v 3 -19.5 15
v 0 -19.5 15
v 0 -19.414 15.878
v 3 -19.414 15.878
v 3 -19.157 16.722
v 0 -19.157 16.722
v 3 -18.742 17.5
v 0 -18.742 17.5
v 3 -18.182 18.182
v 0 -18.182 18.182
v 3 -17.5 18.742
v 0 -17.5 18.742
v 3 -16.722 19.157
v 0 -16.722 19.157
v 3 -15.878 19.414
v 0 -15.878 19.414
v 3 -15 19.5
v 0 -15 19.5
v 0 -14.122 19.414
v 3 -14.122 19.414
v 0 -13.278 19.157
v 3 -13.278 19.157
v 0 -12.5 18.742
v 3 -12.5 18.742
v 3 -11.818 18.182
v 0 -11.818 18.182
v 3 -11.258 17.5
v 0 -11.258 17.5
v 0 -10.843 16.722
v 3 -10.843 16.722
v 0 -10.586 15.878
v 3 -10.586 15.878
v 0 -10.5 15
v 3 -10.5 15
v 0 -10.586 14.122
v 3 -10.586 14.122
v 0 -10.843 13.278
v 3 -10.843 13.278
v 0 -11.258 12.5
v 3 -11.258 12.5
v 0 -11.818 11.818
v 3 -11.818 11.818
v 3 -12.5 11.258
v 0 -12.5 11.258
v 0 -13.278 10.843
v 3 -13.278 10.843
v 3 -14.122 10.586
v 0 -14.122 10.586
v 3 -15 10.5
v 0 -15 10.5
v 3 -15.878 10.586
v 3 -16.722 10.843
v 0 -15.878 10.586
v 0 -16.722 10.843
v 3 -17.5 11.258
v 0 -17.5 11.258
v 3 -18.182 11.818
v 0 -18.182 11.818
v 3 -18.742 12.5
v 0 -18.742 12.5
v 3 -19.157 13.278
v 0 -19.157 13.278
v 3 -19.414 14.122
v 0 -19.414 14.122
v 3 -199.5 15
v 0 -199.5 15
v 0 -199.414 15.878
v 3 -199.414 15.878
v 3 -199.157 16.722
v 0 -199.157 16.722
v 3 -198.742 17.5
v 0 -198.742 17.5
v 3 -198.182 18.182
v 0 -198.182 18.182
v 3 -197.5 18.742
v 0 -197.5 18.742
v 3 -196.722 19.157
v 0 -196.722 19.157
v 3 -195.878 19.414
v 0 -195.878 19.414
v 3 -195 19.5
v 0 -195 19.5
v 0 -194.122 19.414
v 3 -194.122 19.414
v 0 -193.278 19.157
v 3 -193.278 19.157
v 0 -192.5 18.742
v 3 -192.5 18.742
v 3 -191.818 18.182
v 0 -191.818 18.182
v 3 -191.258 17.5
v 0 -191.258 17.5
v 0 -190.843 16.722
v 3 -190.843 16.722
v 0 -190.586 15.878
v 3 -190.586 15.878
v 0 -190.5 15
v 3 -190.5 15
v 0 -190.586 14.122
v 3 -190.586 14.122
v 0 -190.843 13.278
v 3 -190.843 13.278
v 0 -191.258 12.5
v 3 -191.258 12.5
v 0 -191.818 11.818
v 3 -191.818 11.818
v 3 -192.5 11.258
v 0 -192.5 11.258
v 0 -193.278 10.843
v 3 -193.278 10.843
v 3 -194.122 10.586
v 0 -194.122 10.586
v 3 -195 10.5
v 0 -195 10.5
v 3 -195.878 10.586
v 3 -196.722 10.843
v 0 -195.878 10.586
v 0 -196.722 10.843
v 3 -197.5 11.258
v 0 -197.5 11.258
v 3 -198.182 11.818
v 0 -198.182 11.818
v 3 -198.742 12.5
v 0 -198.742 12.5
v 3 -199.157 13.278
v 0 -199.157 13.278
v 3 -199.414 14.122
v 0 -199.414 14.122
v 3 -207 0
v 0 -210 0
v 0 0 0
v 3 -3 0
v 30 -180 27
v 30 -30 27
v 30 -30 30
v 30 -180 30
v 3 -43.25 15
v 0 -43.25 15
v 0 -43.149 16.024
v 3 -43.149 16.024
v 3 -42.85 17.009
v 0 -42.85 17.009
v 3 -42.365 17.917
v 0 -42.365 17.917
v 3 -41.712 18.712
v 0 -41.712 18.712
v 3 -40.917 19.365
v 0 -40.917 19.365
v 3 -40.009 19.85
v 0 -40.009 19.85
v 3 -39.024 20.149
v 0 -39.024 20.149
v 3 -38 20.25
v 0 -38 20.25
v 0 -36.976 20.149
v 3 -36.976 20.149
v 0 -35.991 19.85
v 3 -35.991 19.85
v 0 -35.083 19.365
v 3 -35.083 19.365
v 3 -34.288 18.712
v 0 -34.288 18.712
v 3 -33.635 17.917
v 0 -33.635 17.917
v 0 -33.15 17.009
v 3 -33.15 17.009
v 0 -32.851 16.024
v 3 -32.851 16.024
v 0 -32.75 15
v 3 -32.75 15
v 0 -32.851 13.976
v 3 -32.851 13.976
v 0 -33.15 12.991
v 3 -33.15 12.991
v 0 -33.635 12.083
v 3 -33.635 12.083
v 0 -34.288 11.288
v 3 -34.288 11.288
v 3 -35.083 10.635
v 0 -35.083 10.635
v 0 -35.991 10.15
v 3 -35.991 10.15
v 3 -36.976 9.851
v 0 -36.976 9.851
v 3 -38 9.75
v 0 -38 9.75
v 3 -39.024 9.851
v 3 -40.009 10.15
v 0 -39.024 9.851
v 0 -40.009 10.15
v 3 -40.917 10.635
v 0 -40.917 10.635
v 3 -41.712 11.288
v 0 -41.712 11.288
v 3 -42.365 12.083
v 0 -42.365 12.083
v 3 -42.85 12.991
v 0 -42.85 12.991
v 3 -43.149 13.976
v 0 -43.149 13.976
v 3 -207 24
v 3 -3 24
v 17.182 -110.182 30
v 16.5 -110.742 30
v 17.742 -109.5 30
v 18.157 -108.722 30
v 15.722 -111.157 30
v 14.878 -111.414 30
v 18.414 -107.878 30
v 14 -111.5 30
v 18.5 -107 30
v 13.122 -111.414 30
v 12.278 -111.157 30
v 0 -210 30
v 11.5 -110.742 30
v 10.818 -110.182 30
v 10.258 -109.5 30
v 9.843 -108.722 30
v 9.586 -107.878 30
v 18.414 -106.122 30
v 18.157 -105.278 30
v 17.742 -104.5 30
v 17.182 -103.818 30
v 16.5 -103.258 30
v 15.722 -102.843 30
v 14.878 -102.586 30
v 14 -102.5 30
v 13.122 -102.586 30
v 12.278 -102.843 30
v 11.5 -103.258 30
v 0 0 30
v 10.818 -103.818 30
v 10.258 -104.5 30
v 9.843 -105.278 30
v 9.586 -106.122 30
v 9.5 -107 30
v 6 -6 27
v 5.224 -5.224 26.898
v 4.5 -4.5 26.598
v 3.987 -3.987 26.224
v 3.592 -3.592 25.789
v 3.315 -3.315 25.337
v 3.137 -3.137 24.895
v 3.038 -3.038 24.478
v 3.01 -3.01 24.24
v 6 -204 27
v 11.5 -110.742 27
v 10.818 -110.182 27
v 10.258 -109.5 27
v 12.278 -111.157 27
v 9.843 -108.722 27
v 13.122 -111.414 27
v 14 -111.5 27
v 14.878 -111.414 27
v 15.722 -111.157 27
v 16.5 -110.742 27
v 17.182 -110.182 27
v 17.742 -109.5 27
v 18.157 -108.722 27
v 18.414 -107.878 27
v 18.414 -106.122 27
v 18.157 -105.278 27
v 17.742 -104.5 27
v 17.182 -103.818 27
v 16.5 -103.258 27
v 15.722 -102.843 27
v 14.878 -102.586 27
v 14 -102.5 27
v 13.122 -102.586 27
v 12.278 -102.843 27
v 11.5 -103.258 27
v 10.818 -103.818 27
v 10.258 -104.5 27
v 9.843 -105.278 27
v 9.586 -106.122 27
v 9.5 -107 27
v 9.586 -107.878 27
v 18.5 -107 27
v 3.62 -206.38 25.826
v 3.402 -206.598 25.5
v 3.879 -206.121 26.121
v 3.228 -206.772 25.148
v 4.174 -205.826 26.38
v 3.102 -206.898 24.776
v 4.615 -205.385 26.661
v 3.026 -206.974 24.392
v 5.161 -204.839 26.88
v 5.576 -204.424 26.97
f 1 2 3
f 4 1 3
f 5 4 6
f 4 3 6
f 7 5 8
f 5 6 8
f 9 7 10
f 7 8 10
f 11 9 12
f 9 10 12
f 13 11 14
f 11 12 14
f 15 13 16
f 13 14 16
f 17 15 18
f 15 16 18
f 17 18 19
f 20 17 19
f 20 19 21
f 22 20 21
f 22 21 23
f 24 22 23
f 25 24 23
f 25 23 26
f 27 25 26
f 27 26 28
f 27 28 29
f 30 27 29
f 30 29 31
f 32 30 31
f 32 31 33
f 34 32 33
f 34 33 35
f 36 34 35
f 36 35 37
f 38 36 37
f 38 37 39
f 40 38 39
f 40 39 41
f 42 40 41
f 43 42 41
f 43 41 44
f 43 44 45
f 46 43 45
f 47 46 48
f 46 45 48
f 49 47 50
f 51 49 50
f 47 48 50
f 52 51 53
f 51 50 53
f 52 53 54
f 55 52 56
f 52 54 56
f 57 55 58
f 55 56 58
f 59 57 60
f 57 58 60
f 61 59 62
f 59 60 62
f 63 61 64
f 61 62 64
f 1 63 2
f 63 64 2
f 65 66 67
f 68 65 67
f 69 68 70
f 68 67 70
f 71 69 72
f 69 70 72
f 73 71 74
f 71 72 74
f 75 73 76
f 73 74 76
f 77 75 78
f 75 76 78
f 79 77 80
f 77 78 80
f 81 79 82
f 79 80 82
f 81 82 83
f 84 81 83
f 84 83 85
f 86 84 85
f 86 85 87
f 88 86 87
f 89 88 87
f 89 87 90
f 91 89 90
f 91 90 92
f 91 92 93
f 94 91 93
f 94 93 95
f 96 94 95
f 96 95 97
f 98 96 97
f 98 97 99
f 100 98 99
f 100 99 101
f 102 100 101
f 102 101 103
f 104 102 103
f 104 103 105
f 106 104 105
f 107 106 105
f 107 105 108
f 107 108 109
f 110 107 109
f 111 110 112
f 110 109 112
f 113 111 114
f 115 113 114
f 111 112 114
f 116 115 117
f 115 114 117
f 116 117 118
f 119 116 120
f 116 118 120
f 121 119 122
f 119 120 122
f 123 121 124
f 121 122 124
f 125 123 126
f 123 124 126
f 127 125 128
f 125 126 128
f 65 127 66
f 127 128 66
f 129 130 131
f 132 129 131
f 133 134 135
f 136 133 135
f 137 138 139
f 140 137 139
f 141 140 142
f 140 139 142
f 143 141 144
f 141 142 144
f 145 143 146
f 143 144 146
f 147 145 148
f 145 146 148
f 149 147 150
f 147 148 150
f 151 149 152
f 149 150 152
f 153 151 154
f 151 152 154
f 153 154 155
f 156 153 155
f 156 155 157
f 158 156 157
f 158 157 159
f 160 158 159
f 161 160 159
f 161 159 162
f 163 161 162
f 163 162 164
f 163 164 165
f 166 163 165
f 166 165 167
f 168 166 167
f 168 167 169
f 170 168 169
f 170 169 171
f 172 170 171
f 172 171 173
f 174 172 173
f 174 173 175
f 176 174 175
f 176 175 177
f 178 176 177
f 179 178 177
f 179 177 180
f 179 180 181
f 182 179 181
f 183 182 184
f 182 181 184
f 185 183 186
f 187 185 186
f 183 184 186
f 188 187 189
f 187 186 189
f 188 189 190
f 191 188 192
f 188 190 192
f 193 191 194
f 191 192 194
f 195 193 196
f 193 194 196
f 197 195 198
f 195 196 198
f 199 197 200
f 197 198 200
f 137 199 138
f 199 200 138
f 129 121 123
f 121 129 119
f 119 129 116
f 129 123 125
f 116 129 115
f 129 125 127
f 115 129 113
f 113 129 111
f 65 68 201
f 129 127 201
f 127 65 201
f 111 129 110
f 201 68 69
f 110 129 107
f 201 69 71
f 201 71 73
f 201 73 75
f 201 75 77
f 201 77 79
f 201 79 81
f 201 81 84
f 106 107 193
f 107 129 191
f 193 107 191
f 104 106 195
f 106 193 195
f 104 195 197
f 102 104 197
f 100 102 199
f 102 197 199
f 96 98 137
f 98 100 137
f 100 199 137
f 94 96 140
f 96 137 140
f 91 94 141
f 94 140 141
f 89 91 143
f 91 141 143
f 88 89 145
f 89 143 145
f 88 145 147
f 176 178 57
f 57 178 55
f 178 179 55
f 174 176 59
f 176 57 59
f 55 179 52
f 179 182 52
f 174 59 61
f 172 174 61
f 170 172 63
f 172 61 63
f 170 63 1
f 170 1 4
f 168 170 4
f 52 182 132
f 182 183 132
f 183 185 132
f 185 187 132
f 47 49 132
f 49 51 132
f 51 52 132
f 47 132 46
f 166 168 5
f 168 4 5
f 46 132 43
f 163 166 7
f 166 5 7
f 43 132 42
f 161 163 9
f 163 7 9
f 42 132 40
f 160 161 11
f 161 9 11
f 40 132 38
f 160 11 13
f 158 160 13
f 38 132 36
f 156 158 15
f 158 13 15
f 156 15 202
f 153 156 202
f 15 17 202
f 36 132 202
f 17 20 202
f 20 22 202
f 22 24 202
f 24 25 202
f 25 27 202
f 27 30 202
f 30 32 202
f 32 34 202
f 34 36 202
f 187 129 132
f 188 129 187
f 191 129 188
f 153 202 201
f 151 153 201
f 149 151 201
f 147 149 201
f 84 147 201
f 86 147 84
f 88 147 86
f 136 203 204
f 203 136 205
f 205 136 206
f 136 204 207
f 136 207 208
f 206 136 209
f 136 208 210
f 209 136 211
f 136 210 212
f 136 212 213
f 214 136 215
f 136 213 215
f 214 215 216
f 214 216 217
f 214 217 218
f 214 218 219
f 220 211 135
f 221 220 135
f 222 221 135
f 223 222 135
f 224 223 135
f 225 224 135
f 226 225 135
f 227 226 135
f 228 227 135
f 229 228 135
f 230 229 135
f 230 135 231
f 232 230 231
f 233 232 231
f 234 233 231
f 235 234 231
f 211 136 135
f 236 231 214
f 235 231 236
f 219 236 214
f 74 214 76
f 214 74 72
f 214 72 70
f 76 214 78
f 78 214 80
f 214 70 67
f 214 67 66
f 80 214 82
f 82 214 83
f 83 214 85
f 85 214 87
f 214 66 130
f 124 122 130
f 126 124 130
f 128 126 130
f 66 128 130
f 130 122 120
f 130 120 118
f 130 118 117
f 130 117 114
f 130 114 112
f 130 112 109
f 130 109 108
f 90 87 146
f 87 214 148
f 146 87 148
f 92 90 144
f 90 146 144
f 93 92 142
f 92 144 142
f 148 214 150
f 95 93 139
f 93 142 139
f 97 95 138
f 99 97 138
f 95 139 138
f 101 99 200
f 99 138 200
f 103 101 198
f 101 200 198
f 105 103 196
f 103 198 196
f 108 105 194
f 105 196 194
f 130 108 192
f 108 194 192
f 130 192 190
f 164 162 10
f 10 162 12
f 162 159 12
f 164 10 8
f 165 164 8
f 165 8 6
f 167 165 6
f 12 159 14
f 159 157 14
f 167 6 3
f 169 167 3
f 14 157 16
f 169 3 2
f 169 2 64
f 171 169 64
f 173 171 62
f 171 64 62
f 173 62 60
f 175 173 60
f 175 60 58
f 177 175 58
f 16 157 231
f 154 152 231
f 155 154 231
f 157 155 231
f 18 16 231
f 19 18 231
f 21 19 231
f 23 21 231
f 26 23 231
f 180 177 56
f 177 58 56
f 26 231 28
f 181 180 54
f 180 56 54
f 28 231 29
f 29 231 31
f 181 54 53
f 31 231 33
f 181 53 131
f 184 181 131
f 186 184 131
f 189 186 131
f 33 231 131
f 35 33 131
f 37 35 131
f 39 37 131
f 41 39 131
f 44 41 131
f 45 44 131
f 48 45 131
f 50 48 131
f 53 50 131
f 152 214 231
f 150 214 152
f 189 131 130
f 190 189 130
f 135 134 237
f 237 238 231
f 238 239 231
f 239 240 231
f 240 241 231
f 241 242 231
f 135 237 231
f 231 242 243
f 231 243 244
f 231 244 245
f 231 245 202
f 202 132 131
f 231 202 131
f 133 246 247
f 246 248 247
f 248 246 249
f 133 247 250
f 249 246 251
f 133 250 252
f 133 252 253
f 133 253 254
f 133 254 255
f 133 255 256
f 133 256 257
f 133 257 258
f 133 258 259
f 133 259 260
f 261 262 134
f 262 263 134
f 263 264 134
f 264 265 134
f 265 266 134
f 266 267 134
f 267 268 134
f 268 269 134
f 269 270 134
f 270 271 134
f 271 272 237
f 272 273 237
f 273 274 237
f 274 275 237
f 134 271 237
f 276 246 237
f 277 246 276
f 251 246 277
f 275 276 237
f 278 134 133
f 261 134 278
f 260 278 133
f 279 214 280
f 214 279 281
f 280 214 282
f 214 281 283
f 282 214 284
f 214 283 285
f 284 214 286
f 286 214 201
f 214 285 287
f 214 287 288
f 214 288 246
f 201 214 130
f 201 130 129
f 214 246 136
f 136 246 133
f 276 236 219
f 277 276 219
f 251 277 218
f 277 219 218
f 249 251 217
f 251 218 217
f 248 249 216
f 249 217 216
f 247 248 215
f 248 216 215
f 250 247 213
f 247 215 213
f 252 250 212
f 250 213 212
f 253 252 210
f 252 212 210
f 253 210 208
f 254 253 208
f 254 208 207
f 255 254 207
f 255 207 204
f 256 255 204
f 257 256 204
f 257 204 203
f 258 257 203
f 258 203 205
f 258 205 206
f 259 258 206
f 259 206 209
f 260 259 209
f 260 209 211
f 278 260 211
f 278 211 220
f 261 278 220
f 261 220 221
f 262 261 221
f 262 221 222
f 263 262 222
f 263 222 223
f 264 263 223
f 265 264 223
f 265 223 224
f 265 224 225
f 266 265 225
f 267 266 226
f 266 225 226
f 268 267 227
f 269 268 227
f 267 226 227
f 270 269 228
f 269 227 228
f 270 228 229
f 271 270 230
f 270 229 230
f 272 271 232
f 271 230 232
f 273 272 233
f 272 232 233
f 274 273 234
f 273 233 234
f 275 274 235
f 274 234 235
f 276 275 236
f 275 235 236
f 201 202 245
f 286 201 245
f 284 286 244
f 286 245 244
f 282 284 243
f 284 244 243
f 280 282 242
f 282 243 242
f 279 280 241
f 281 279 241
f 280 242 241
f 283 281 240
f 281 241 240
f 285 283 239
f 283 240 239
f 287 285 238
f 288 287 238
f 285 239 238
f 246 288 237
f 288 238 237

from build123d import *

# Parameters (mm, degrees)
F1_DEPTH = 210
F3_D     = 9
F3_DEPTH = 12
F3_TIP   = 2.7038727856
F5_D     = 10.5
F5_DEPTH = 12
F5_TIP   = 3.1545182499
F7_D     = 9
F7_DEPTH = 12
F7_TIP   = 2.7038727856
F9_DEPTH = 94


with BuildPart() as f1:
    # F0 (on Front) → F1 (new body)
    with BuildSketch(Plane.XZ):
        with BuildLine():
            Line((0, 30), (0, 0))
            Line((0, 0), (3, 0))
            Line((3, 0), (3, 24))
            ThreePointArc((3, 24), (3.8786796564, 26.1213203436), (6, 27))
            Line((6, 27), (30, 27))
            Line((30, 27), (30, 30))
            Line((30, 30), (0, 30))
        make_face()
    extrude(amount=F1_DEPTH)

    # F3
    with Locations(Plane.YZ.offset(3)):
        with Locations((-195, 15), (-15, 15)):
            Hole(F3_D / 2, depth=F3_DEPTH)
            with Locations((0, 0, -(F3_DEPTH + F3_TIP / 2))):  # 118° drill point
                Cone(0, F3_D / 2, F3_TIP, mode=Mode.SUBTRACT)

    # F5
    with Locations(Plane.YZ.offset(3)):
        with Locations((-38, 15)):
            Hole(F5_D / 2, depth=F5_DEPTH)
            with Locations((0, 0, -(F5_DEPTH + F5_TIP / 2))):  # 118° drill point
                Cone(0, F5_D / 2, F5_TIP, mode=Mode.SUBTRACT)

    # F7
    with Locations(Plane(origin=(0, 0, 27), x_dir=(1, 0, 0), z_dir=(0, 0, -1))):
        with Locations((14, 107)):
            Hole(F7_D / 2, depth=F7_DEPTH)
            with Locations((0, 0, -(F7_DEPTH + F7_TIP / 2))):  # 118° drill point
                Cone(0, F7_D / 2, F7_TIP, mode=Mode.SUBTRACT)

    # F8 (on face) → F9 (cut)
    with BuildSketch(Plane(origin=(0, 0, 0), x_dir=(1, 0, 0), z_dir=(0, 0, -1))):
        Polygon((30, 30), (3, 3), (3, 0), (30, 0), align=None)
        Polygon((3, 210), (3, 207), (30, 180), (30, 210), align=None)
        Polygon((3, 3), (0, 0), (3, 0), align=None)
        Polygon((3, 210), (0, 210), (3, 207), align=None)
    extrude(amount=-F9_DEPTH, mode=Mode.SUBTRACT)


solid = f1.part
